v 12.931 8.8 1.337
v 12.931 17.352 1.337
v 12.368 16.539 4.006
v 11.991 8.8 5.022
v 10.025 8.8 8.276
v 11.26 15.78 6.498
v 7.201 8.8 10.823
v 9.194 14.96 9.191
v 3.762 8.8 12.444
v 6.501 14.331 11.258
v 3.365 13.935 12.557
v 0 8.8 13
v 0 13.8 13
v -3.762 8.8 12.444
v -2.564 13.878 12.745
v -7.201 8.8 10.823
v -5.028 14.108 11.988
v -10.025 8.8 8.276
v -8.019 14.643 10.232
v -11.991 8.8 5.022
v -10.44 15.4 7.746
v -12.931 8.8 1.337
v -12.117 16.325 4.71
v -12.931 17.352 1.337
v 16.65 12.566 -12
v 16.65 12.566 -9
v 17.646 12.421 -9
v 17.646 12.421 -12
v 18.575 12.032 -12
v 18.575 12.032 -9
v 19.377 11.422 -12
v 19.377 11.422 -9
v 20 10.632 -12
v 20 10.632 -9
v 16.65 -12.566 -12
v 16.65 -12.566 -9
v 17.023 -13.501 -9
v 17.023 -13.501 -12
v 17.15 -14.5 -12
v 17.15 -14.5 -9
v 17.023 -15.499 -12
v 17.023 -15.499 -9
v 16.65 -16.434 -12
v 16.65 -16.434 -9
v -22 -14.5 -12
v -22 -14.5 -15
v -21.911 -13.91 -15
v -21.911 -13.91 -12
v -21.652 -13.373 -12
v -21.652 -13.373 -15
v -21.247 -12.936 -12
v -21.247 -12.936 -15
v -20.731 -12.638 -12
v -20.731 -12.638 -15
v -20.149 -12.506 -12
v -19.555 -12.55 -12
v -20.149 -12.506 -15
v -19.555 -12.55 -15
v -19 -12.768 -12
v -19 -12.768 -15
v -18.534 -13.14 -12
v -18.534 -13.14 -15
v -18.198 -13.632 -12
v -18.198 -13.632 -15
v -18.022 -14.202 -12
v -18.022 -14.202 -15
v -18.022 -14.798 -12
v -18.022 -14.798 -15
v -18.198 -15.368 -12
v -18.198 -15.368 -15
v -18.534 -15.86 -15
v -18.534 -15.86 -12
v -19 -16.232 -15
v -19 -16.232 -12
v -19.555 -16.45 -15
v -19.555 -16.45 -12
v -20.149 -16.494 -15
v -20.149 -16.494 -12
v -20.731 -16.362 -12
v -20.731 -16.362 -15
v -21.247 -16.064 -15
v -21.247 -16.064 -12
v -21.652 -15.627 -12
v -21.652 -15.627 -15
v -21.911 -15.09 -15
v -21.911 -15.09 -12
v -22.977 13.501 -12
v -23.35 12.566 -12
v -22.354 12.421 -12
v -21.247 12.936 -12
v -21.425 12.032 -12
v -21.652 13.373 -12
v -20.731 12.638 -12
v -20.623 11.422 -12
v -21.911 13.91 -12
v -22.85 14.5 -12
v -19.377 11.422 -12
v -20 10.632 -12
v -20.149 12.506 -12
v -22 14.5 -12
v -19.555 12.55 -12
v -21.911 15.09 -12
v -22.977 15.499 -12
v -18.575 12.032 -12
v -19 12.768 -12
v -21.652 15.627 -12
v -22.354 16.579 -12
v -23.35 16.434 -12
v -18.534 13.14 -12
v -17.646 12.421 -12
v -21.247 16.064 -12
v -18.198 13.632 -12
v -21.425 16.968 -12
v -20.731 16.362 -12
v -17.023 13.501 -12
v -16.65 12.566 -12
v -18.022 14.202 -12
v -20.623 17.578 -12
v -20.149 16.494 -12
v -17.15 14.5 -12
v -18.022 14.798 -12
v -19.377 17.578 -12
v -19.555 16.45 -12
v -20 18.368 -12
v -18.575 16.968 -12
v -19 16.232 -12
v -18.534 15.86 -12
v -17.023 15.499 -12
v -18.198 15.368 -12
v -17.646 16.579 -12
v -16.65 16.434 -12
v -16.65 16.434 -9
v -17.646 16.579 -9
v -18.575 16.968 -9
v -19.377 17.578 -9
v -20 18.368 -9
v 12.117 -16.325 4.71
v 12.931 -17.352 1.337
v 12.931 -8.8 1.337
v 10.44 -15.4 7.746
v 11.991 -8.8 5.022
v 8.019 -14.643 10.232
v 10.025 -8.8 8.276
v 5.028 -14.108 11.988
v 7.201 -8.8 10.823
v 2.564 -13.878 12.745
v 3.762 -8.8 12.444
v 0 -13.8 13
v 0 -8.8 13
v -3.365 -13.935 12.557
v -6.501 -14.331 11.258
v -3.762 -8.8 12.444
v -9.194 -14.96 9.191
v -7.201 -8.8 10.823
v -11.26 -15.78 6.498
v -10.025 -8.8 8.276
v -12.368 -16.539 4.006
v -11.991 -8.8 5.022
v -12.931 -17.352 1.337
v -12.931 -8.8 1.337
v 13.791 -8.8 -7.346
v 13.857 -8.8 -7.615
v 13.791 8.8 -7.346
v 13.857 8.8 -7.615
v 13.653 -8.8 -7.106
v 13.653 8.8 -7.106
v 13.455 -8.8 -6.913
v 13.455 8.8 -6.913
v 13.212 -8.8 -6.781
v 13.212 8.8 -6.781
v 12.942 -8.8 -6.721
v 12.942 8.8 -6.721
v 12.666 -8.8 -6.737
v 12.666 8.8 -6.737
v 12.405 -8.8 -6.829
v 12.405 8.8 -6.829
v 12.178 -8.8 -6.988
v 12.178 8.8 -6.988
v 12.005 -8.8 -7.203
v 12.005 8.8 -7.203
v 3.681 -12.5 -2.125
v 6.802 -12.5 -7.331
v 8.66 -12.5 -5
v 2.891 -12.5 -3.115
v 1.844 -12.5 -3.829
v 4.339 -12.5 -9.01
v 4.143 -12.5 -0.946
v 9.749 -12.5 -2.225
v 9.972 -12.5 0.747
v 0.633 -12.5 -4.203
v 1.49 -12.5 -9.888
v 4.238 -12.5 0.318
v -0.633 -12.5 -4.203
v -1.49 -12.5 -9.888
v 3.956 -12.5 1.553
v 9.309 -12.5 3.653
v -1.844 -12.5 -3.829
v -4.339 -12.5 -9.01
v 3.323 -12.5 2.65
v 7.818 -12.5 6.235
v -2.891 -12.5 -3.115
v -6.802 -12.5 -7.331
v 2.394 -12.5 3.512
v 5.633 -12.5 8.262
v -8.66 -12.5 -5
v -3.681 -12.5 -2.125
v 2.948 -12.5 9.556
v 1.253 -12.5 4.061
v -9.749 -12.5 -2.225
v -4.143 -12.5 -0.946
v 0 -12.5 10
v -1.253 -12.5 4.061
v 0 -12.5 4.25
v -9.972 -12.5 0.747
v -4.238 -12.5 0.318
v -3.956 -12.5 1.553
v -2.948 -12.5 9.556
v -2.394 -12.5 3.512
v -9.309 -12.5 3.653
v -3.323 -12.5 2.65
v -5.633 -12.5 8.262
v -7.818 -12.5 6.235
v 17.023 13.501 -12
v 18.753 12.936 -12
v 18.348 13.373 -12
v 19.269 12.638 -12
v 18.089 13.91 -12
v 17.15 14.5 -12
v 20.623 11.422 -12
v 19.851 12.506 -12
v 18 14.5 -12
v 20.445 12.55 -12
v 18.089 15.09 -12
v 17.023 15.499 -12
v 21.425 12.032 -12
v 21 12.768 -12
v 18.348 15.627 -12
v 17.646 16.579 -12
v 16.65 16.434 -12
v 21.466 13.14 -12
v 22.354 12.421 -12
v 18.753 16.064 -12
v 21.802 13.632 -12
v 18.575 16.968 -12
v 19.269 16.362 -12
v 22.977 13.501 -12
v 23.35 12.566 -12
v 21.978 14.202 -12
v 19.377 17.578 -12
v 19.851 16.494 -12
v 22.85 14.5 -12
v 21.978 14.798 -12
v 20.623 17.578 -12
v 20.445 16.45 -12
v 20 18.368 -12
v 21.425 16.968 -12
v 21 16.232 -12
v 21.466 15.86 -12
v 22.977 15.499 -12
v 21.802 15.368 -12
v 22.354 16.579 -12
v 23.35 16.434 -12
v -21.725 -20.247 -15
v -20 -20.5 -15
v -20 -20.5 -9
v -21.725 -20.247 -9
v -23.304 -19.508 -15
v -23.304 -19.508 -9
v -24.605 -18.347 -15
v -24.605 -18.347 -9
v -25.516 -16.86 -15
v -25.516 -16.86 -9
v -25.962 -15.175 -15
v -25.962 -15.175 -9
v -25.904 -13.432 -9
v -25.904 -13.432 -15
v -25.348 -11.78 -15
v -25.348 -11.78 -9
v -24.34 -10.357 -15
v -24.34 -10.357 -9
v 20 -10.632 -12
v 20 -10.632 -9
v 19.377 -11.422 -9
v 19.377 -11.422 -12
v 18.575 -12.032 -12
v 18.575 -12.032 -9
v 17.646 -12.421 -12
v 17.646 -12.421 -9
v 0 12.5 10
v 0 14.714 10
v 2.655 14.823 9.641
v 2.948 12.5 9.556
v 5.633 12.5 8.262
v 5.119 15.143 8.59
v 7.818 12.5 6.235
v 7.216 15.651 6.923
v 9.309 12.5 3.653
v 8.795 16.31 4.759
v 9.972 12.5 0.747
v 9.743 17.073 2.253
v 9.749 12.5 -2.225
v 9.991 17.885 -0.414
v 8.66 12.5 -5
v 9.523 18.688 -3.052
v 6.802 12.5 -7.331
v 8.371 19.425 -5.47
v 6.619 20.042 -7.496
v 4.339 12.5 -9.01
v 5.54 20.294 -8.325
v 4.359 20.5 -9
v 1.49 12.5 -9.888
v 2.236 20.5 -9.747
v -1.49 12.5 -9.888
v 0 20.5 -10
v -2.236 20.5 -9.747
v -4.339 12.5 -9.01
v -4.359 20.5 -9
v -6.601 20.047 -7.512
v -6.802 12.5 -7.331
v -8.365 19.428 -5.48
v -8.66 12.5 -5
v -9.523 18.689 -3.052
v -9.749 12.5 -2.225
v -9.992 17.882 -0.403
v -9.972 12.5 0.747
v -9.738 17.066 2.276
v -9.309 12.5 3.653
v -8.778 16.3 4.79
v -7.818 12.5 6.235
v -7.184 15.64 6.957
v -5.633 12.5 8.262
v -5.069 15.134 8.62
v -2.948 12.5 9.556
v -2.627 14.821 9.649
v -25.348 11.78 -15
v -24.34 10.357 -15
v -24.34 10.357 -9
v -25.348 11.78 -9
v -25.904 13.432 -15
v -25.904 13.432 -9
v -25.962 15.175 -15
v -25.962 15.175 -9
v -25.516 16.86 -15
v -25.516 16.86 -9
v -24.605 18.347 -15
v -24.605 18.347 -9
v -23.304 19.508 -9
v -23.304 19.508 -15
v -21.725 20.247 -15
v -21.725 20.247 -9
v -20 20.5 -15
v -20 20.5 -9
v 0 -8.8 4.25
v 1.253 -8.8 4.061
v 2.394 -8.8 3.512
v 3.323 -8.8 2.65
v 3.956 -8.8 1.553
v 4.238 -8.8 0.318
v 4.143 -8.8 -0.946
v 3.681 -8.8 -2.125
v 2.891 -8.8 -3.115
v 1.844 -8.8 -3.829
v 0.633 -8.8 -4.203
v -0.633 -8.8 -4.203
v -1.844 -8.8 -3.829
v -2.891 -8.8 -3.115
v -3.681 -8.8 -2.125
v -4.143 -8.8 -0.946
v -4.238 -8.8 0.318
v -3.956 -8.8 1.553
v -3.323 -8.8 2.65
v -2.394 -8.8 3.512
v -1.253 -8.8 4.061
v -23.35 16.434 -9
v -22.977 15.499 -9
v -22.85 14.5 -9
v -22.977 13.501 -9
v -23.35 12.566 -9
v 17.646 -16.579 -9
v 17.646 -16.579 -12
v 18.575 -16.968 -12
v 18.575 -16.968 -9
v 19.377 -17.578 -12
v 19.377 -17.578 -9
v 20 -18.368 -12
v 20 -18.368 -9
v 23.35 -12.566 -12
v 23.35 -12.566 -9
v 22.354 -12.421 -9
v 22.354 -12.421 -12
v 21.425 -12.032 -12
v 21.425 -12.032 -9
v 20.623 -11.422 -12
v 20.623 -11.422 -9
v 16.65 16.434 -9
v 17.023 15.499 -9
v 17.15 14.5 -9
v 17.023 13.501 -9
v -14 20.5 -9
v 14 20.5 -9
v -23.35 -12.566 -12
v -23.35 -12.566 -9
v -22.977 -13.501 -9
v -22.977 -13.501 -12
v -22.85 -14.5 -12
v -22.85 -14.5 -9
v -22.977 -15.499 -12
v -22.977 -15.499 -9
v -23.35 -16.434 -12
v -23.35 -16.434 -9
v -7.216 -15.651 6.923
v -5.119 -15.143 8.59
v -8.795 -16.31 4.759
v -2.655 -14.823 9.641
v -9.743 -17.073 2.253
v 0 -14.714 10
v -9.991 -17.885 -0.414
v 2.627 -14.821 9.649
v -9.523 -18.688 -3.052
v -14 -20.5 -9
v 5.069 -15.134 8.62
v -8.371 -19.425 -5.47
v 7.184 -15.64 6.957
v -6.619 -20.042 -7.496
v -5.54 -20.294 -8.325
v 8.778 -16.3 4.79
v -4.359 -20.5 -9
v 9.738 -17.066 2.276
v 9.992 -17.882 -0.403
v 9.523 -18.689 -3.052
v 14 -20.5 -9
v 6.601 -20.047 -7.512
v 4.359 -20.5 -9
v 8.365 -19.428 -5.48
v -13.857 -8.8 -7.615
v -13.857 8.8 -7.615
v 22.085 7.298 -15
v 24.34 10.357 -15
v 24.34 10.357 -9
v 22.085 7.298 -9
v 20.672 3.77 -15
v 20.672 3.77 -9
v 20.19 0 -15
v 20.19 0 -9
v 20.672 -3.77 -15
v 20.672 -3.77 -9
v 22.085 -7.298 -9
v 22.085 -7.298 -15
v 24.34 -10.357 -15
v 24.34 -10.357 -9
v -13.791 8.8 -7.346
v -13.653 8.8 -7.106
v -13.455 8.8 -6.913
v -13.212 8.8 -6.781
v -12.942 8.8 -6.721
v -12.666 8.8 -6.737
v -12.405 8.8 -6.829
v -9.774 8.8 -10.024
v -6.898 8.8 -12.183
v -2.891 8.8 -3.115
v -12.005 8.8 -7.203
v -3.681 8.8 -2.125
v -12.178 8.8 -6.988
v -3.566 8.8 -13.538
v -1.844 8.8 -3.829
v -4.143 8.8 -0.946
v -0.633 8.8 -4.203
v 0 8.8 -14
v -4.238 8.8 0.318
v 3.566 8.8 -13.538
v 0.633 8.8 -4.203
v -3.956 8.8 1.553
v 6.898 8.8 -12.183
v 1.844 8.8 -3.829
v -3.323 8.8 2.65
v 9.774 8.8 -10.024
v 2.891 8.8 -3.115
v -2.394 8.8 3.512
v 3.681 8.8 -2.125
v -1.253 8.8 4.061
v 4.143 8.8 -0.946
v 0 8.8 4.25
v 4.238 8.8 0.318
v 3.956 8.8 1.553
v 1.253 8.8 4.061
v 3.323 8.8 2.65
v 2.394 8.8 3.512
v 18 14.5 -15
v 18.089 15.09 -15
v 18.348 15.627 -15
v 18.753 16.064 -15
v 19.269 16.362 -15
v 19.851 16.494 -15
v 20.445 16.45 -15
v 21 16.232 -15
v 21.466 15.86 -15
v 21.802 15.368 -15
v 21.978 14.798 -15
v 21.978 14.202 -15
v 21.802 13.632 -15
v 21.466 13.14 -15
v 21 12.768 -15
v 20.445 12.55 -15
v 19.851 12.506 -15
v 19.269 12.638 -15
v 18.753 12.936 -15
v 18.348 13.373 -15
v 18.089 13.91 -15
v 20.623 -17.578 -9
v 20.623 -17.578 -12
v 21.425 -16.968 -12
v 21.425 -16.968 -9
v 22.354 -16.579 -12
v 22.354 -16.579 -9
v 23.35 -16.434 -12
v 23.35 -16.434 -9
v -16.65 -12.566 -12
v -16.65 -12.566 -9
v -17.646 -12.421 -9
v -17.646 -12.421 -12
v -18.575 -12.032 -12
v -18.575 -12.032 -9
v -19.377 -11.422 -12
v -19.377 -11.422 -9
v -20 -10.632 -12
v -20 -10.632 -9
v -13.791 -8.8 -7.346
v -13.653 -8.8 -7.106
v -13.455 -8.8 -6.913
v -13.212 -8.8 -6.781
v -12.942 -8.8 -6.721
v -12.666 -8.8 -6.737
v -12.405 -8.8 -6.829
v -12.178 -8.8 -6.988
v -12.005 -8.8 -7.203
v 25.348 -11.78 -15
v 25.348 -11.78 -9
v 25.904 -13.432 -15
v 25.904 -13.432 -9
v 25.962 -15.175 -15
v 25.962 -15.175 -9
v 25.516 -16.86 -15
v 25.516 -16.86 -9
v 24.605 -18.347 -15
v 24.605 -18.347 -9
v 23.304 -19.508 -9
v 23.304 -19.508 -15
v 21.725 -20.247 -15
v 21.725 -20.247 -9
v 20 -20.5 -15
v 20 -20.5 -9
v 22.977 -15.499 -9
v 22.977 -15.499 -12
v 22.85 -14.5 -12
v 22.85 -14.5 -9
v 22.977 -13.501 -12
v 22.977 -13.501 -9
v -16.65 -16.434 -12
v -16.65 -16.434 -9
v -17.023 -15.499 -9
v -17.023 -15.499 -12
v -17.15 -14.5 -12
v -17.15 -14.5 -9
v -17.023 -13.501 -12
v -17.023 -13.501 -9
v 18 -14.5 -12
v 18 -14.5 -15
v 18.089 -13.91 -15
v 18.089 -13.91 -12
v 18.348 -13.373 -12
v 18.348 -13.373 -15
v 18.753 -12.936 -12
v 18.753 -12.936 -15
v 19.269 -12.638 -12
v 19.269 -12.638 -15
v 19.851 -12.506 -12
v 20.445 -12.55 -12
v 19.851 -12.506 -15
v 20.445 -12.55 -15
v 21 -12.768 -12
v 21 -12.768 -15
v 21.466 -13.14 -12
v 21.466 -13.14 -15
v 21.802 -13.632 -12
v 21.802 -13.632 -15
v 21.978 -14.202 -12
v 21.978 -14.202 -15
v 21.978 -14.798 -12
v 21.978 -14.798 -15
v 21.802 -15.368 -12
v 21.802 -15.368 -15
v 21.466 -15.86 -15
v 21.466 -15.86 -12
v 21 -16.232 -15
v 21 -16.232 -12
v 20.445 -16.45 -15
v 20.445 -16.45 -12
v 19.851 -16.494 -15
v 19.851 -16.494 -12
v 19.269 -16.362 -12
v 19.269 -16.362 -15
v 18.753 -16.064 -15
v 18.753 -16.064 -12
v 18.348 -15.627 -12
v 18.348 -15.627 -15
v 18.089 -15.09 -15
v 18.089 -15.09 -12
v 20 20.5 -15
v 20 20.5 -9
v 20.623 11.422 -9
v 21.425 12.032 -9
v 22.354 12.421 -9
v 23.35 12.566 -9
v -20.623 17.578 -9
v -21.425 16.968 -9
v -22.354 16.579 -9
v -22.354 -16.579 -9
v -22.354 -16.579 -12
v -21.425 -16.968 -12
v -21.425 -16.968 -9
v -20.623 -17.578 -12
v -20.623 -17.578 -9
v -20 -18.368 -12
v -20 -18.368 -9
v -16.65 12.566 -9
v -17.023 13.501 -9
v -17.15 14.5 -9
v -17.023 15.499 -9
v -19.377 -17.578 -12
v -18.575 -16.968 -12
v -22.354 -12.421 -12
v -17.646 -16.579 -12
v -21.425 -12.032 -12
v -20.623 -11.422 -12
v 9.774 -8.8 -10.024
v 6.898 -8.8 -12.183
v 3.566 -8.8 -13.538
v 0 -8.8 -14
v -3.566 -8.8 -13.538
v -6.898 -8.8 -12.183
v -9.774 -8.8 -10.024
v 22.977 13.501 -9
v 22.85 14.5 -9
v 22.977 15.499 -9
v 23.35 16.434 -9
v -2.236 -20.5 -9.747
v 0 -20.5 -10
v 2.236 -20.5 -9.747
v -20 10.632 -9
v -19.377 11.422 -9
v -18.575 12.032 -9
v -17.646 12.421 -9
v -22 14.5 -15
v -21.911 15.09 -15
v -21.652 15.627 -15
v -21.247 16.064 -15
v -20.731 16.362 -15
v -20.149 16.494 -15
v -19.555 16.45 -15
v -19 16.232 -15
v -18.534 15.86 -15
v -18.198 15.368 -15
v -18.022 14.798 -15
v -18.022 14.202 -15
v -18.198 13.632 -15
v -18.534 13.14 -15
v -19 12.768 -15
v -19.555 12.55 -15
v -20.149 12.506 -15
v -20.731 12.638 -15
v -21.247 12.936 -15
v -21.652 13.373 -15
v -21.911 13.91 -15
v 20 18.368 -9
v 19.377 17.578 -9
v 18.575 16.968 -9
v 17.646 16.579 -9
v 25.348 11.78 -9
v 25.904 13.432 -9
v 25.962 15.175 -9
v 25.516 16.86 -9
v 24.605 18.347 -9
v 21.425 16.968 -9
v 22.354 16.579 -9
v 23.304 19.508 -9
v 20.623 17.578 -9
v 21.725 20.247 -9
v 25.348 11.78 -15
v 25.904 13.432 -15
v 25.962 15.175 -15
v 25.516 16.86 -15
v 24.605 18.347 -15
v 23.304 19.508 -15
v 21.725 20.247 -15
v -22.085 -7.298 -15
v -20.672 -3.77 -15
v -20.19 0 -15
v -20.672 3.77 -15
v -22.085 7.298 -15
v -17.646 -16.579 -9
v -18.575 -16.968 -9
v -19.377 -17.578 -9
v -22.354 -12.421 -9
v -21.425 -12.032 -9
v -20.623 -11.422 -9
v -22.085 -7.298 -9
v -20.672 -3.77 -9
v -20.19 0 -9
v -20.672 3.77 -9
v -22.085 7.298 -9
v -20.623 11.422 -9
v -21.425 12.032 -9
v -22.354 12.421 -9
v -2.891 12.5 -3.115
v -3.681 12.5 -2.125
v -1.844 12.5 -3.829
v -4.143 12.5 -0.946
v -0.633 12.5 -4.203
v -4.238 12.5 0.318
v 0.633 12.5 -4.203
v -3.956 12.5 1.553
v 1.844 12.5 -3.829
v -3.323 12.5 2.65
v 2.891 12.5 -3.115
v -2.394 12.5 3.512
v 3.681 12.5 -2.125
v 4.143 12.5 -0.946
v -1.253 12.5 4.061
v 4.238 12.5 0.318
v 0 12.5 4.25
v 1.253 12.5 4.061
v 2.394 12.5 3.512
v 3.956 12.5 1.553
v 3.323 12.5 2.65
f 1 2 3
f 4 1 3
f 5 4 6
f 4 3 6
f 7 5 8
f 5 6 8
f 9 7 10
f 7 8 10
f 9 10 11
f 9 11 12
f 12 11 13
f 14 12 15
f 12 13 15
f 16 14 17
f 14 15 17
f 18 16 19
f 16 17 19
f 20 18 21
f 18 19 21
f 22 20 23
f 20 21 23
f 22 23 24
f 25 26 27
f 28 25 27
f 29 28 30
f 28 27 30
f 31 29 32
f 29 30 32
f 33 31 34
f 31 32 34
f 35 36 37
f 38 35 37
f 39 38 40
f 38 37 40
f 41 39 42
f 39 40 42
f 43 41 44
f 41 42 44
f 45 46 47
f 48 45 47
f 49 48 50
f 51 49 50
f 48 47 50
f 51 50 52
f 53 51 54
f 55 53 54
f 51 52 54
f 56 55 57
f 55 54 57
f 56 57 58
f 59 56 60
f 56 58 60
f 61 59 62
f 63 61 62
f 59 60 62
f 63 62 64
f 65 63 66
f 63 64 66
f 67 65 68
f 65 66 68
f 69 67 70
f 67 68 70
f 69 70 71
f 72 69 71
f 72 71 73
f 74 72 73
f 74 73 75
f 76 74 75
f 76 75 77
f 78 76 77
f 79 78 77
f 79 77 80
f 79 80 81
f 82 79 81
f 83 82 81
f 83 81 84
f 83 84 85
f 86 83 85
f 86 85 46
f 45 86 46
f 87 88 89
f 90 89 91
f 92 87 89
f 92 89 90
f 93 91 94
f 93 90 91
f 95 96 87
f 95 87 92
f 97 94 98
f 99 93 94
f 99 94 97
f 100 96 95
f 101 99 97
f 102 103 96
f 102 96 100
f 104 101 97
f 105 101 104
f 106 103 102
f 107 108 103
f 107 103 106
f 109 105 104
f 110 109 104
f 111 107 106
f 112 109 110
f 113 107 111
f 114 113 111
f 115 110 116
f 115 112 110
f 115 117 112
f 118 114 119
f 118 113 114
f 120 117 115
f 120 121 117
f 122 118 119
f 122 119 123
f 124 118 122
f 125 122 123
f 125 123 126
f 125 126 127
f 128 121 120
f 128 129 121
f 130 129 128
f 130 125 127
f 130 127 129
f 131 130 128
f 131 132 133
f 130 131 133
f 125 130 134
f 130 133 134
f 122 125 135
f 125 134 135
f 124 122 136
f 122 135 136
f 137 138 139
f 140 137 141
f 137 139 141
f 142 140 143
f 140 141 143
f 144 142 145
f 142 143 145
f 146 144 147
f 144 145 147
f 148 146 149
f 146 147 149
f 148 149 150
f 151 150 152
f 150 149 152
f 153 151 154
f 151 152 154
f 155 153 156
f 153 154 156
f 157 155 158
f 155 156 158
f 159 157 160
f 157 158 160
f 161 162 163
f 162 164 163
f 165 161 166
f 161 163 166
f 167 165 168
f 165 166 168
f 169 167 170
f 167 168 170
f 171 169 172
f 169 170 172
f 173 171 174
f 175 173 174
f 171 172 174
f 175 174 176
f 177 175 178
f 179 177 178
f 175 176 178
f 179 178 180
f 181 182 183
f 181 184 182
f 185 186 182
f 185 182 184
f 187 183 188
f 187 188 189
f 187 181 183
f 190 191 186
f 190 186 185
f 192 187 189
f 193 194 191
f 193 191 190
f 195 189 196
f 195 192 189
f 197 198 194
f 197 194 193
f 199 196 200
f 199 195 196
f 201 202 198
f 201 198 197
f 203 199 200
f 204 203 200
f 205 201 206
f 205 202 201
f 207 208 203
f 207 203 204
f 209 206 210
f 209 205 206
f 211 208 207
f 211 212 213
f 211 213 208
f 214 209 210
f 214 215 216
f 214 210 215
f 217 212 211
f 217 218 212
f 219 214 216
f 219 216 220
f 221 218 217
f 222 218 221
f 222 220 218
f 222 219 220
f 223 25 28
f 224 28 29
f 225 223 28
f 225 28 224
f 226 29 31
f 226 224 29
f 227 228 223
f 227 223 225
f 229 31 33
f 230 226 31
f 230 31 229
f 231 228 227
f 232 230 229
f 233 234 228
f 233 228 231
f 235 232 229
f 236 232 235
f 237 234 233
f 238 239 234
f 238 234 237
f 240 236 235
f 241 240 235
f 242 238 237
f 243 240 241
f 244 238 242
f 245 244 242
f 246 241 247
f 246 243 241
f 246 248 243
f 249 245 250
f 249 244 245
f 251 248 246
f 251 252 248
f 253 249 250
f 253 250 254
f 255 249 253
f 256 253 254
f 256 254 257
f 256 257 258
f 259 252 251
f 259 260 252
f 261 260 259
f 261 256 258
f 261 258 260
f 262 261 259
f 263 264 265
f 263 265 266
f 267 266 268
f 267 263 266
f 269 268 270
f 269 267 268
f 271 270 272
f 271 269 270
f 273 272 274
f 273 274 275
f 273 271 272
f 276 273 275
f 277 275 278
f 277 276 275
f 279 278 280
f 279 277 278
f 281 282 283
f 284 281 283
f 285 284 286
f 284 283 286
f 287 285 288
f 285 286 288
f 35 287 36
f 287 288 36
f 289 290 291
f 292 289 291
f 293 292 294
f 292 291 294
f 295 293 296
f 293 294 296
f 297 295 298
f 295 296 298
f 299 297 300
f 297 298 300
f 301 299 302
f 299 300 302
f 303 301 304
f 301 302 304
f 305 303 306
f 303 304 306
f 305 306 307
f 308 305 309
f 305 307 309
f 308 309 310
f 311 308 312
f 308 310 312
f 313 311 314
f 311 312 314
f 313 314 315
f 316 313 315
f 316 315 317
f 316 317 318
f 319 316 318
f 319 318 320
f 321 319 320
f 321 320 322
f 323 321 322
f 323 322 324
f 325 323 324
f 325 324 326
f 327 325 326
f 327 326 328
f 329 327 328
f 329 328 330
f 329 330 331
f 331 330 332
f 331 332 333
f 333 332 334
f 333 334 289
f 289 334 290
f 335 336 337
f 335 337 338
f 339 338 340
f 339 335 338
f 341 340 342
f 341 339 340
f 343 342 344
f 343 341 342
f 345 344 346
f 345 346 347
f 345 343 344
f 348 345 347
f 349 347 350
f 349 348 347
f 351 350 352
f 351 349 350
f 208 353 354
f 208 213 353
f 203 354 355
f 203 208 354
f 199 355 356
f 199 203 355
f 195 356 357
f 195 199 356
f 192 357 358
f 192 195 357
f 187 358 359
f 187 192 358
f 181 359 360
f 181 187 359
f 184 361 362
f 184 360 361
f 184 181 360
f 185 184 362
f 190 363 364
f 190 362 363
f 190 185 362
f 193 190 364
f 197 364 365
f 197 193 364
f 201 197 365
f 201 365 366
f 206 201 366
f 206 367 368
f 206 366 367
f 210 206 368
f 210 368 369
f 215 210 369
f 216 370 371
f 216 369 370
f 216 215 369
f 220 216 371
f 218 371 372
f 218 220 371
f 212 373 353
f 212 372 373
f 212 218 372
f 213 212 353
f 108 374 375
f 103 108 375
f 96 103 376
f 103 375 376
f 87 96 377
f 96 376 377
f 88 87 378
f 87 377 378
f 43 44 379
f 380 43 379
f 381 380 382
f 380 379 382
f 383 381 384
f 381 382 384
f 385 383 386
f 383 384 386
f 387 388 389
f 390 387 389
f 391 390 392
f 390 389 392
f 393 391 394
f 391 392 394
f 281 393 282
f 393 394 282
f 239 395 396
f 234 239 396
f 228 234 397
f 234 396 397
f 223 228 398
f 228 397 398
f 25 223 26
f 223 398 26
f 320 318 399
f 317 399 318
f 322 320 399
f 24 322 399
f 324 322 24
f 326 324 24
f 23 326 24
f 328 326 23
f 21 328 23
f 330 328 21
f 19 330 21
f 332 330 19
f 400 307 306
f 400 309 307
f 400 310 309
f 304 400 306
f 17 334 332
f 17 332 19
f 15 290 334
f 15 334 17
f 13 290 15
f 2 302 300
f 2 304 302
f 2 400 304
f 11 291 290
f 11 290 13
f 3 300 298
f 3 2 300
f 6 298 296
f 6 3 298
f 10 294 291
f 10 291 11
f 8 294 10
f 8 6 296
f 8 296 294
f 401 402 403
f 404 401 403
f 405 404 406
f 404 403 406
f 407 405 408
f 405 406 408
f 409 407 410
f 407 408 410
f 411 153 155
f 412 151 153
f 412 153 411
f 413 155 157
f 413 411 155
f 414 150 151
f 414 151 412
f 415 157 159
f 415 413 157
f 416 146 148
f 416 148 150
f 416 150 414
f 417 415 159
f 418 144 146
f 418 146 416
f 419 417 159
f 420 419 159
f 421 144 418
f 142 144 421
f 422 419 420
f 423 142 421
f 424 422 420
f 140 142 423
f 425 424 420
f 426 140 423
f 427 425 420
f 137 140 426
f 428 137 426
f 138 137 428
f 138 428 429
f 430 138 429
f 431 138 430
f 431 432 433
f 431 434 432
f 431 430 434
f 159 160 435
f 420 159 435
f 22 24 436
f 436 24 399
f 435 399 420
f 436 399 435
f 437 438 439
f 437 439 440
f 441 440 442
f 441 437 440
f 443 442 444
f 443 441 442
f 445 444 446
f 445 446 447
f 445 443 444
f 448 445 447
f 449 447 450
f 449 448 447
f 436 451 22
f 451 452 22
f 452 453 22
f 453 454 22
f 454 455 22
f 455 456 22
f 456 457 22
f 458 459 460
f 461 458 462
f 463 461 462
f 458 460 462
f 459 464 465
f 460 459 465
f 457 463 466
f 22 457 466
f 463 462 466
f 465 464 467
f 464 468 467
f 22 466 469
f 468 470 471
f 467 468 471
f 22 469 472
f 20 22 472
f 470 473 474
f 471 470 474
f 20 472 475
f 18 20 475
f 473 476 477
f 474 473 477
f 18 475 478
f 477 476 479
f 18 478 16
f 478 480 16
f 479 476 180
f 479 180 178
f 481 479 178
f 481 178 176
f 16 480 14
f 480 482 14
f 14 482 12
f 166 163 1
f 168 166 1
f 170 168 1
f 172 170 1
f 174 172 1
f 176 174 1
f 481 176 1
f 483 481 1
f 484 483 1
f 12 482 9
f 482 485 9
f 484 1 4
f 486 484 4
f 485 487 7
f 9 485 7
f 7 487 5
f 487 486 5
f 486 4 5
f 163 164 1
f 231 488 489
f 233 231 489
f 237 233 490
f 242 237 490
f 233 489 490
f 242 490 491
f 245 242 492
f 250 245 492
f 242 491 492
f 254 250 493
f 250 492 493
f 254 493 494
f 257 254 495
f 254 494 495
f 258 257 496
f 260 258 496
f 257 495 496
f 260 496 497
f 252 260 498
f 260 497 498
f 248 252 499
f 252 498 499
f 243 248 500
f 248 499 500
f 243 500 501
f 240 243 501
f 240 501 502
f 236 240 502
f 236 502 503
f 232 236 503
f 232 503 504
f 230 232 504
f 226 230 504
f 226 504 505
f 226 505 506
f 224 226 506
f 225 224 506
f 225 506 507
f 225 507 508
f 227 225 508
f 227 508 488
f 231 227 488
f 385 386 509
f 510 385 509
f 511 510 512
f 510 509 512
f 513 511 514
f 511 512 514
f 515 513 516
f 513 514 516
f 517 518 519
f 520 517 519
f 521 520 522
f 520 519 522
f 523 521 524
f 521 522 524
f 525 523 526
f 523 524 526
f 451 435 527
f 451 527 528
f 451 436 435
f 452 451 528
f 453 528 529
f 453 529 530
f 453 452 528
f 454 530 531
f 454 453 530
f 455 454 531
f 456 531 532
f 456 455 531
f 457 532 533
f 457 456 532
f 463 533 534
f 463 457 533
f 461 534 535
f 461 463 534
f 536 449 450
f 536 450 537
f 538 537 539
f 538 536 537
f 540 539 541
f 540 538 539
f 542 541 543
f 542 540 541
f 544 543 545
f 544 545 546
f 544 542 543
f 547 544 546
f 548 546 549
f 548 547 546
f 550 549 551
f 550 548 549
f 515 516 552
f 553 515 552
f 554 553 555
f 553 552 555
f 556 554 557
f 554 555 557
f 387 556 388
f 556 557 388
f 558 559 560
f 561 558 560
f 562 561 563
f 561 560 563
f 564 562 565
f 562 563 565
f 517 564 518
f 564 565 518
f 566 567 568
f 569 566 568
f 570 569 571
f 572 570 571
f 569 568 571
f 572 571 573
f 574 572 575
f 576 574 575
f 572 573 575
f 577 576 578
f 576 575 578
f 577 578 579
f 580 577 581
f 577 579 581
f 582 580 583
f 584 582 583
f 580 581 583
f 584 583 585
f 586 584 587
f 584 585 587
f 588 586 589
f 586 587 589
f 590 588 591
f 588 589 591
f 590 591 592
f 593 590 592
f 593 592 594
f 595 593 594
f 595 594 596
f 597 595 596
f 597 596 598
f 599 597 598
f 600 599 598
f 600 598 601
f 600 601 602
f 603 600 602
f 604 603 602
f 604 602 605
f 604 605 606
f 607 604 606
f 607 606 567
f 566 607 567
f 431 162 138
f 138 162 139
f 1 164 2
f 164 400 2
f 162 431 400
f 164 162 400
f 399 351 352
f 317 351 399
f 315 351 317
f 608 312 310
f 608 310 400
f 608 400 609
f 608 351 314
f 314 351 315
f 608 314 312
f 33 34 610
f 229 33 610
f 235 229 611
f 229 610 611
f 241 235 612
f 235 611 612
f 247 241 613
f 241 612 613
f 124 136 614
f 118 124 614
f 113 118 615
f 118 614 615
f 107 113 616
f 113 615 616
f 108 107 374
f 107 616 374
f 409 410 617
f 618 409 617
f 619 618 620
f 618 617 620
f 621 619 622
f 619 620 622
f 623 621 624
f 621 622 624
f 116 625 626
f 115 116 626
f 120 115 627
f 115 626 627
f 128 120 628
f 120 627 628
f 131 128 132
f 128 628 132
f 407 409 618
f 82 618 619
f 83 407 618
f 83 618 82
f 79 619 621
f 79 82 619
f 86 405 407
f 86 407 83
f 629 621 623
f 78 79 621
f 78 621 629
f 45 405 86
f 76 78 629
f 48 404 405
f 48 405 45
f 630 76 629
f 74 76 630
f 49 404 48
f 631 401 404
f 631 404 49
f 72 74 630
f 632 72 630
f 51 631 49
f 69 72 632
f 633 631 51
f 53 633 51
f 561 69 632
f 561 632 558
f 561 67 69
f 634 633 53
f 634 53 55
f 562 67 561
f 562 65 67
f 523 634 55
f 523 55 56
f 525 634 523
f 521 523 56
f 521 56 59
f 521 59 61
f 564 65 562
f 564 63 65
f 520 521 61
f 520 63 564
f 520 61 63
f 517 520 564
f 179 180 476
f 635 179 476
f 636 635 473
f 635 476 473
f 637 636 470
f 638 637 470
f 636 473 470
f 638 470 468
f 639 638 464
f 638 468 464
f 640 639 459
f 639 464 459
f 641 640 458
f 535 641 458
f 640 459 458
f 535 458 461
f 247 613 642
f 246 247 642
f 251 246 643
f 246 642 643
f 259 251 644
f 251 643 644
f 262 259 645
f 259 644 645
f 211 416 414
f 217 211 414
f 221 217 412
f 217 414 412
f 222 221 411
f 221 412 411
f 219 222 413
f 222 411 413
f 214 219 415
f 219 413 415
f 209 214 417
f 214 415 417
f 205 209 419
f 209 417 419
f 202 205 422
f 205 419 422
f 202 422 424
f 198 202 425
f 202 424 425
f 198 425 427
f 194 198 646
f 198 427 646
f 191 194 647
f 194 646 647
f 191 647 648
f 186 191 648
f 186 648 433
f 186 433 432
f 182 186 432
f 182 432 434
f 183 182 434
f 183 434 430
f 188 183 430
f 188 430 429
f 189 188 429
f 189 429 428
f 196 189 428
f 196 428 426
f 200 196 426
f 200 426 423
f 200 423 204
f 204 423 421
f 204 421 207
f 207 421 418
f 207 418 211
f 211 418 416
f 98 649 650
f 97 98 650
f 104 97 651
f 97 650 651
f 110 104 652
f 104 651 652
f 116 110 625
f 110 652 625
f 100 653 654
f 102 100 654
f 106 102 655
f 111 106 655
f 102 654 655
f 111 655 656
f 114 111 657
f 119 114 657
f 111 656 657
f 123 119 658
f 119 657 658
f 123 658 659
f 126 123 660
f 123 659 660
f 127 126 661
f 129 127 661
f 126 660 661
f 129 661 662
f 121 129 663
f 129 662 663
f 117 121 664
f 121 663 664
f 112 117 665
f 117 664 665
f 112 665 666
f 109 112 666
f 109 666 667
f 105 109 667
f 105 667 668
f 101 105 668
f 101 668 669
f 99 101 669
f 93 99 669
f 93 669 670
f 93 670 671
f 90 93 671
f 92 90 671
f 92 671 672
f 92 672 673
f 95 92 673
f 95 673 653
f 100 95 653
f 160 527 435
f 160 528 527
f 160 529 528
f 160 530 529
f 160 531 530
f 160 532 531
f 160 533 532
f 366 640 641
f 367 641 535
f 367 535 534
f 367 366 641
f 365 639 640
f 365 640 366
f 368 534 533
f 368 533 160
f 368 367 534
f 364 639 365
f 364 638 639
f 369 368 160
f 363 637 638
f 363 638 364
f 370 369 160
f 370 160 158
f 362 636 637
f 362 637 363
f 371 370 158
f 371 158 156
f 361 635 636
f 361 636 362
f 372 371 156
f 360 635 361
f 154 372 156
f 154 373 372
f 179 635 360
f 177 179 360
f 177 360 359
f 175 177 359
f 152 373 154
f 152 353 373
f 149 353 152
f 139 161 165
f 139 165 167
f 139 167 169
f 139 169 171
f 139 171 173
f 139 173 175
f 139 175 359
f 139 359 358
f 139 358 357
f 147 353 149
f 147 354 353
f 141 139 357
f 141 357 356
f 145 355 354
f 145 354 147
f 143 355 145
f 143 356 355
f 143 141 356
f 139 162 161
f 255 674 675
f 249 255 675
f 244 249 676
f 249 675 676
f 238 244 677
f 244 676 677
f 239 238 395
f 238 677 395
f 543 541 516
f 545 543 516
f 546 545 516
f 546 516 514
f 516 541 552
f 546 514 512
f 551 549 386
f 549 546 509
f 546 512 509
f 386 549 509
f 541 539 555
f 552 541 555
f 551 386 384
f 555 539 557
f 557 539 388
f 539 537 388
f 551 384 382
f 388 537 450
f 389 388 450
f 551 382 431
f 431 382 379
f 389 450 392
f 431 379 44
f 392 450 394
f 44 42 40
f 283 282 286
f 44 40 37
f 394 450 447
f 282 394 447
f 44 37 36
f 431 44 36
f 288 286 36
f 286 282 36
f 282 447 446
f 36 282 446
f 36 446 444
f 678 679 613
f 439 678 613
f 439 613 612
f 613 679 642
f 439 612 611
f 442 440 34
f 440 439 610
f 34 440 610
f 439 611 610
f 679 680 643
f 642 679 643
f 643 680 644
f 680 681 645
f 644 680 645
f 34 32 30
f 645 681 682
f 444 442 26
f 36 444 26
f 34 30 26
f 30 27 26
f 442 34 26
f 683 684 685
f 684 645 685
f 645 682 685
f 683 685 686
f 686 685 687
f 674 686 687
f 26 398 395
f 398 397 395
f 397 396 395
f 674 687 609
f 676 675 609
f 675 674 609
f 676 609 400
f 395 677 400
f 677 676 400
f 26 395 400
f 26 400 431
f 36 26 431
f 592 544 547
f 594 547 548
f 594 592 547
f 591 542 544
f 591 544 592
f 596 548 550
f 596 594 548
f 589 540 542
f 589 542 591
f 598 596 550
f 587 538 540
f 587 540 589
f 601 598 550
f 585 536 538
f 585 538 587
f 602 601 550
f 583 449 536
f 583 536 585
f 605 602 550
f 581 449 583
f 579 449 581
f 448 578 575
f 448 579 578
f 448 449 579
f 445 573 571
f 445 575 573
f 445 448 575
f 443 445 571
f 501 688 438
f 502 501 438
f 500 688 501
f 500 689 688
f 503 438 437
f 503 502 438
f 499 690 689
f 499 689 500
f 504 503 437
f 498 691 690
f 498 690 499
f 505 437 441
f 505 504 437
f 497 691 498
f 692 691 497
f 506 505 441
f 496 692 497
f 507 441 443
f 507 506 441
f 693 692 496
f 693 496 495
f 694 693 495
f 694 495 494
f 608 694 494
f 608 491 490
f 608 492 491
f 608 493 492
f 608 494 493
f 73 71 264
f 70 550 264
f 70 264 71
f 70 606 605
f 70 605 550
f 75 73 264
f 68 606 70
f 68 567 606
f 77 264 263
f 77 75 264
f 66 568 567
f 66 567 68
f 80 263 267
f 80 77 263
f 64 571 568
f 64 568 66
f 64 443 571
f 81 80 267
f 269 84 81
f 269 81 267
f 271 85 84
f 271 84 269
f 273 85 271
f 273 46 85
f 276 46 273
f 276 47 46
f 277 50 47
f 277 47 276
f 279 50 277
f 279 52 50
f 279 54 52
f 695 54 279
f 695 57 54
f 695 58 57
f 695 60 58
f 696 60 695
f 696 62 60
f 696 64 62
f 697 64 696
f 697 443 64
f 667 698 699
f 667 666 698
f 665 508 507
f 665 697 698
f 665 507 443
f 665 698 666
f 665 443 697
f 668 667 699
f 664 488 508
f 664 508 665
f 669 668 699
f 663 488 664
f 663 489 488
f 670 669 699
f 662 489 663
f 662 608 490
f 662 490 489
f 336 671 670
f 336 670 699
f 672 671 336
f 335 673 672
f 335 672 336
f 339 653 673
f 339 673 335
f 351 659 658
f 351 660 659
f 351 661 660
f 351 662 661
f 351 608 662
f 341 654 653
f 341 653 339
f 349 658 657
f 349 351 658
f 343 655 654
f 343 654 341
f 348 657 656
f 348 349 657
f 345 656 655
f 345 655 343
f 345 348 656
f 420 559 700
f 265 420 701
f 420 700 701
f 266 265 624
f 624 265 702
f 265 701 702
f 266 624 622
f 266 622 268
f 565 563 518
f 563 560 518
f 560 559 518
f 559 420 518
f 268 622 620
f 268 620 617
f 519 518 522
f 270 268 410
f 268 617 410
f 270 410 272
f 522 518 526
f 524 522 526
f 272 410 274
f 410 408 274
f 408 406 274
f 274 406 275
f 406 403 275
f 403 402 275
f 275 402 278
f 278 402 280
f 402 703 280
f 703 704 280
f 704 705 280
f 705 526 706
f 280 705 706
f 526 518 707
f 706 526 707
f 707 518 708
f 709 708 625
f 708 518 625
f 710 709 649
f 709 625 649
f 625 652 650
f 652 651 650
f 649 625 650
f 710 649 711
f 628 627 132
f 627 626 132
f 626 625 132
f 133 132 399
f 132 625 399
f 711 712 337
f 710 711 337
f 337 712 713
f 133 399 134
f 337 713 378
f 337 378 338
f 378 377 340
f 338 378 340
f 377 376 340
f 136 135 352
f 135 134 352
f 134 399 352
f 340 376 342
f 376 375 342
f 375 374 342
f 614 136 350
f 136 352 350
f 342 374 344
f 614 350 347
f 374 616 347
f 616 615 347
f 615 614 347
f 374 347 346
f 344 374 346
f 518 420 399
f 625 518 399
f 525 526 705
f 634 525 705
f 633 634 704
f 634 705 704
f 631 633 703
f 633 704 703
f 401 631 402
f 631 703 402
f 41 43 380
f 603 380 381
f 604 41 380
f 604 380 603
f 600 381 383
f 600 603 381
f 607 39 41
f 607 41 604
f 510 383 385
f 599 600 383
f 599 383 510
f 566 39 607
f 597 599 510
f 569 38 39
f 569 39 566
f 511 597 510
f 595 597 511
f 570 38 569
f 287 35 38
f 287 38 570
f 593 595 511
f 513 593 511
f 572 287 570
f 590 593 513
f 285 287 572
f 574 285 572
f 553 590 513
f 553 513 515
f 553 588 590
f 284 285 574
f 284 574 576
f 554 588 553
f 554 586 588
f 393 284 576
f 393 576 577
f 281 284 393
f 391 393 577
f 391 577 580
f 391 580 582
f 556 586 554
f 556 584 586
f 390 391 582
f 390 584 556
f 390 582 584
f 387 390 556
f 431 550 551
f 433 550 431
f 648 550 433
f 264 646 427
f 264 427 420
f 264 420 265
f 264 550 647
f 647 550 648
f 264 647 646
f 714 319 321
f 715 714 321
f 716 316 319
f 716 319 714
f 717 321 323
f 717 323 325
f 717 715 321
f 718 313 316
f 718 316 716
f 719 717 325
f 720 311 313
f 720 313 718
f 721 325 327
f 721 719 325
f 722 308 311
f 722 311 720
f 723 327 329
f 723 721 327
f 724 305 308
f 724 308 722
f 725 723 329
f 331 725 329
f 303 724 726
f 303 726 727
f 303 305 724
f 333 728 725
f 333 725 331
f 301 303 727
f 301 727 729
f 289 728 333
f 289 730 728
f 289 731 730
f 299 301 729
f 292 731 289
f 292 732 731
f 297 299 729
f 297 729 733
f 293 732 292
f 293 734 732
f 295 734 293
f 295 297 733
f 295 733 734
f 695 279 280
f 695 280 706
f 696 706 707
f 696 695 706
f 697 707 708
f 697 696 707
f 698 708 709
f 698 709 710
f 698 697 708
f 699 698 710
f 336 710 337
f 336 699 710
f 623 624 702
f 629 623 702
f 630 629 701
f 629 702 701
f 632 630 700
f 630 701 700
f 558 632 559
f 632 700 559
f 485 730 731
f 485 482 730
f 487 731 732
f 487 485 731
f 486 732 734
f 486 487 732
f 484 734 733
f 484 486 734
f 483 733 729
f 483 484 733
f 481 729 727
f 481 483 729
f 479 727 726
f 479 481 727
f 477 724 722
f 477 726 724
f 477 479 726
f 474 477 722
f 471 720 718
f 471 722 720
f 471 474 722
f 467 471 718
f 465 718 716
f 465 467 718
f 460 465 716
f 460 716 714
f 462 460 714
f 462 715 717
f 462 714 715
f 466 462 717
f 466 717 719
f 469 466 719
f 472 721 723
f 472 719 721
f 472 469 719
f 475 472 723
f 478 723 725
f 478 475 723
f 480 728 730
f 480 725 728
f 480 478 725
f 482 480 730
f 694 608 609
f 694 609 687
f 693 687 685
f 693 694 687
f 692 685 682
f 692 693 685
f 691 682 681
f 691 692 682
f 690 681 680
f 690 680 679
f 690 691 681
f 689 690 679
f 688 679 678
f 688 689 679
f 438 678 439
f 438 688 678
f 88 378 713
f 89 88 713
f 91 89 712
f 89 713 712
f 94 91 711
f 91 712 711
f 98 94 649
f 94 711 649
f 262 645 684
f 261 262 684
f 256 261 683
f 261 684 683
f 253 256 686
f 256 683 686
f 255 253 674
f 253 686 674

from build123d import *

# Parameters (mm, degrees)
SKETCH1_R            = 4.25
BOSS_EXTRUDE1_DEPTH  = 20.5
SKETCH2_W            = 14
SKETCH2_H            = 17.6
CUT_EXTRUDE1_DEPTH   = 29
SKETCH7_R            = 1
BOSS_EXTRUDE2_DEPTH  = 6
CUT_EXTRUDE6_DEPTH   = 3
SKETCH4_R            = 2
CUT_EXTRUDE2_DEPTH   = 7
SKETCH5_R            = 10
CUT_EXTRUDE3_DEPTH   = 8
SKETCH6_R            = 10
CUT_EXTRUDE4_DEPTH   = 8
FILLET1_R            = 1
CUT_EXTRUDE7_DEPTH   = 3
LPATTERN1_COUNT      = 2
LPATTERN1_PITCH      = 40
LPATTERN1_COUNT_DIR2 = 2
LPATTERN1_PITCH_DIR2 = 29


with BuildPart() as part:
    # Sketch1 → Boss-Extrude1 (new body, symmetric)
    with BuildSketch(Plane(origin=(0, 0, 0), x_dir=(1, 0, 0), z_dir=(0, 1, 0))):
        with BuildLine():
            Line((-12.931045729, -1.337182245), (-14, 9))
            Line((-14, 9), (-14, 15))
            Line((-14, 15), (14, 15))
            Line((14, 15), (14, 9))
            Line((14, 9), (12.931045729, -1.337182245))
            ThreePointArc((12.931045729, -1.337182245), (0, -13), (-12.931045729, -1.337182245))
        make_face()
        with Locations(Location((0, 0, 0), (0, 0, 270))):  # turned: the seam where the file's is
            Circle(SKETCH1_R, mode=Mode.SUBTRACT)
    extrude(amount=BOSS_EXTRUDE1_DEPTH, both=True)

    # Sketch2 → Cut-Revolve1 (revolve, cut)
    with BuildSketch(Plane(origin=(0, 0, 0), x_dir=(0, 0, -1), z_dir=(1, 0, 0))):
        with Locations((-7, 0)):
            Rectangle(SKETCH2_W, SKETCH2_H)
    revolve(axis=Axis((0, 0, 0), (0, 1, 0)), mode=Mode.SUBTRACT)

    # Sketch3 → Cut-Extrude1 (cut, through all)
    with BuildSketch(Plane(origin=(14, 0, 0), x_dir=(0, 0, -1), z_dir=(1, 0, 0))):
        Polygon((9, 20.5), (-13, 13.8), (-13, 20.5), align=None)
        Polygon((-13, -13.8), (9, -20.5), (-13, -20.5), align=None)
    extrude(amount=-CUT_EXTRUDE1_DEPTH, mode=Mode.SUBTRACT)

    # Sketch7 → Boss-Extrude2 (add)
    with BuildSketch(Plane(origin=(0, 0, -15), x_dir=(-1, 0, 0), z_dir=(0, 0, -1))):
        with BuildLine():
            Line((20, 20.5), (14, 20.5))
            Line((14, 20.5), (14, -20.5))
            Line((14, -20.5), (20, -20.5))
            ThreePointArc((20, -20.5), (25.516209879, -16.860387377), (24.340130723, -10.357142857))
            ThreePointArc((24.340130723, -10.357142857), (20.190457531, 0), (24.340130723, 10.357142857))
            ThreePointArc((24.340130723, 10.357142857), (25.516209879, 16.860387377), (20, 20.5))
        make_face()
        with Locations((20, -14.5)):
            Circle(SKETCH7_R, mode=Mode.SUBTRACT)
        with Locations((20, 14.5)):
            Circle(SKETCH7_R, mode=Mode.SUBTRACT)
        with BuildLine():
            Line((-20, -20.5), (-14, -20.5))
            Line((-14, -20.5), (-14, 20.5))
            Line((-14, 20.5), (-20, 20.5))
            ThreePointArc((-20, 20.5), (-25.516209879, 16.860387377), (-24.340130723, 10.357142857))
            ThreePointArc((-24.340130723, 10.357142857), (-20.190457531, 0), (-24.340130723, -10.357142857))
            ThreePointArc((-24.340130723, -10.357142857), (-25.516209879, -16.860387377), (-20, -20.5))
        make_face()
        with Locations((-20, 14.5)):
            Circle(SKETCH7_R, mode=Mode.SUBTRACT)
        with Locations((-20, -14.5)):
            Circle(SKETCH7_R, mode=Mode.SUBTRACT)
    extrude(amount=-BOSS_EXTRUDE2_DEPTH)

    # Sketch8 → Cut-Extrude6 (cut)
    with BuildSketch(Plane.XY.offset(-9)):
        Polygon((-17.15, 12.854551733), (-17.15, 16.145448267), (-20, 17.790896534), (-22.85, 16.145448267), (-22.85, 12.854551733), (-20, 11.209103466), align=None)
        Polygon((-17.15, -12.854551733), (-20, -11.209103466), (-22.85, -12.854551733), (-22.85, -16.145448267), (-20, -17.790896534), (-17.15, -16.145448267), align=None)
        Polygon((22.85, -12.854551733), (20, -11.209103466), (17.15, -12.854551733), (17.15, -16.145448267), (20, -17.790896534), (22.85, -16.145448267), align=None)
        Polygon((22.85, 12.854551733), (22.85, 16.145448267), (20, 17.790896534), (17.15, 16.145448267), (17.15, 12.854551733), (20, 11.209103466), align=None)
    extrude(amount=-CUT_EXTRUDE6_DEPTH, mode=Mode.SUBTRACT)

    # Sketch4 → Cut-Extrude2 (cut)
    with BuildSketch(Plane(origin=(0, 0, -15), x_dir=(-1, 0, 0), z_dir=(0, 0, -1))):
        with Locations((-20, 14.5)):
            Circle(SKETCH4_R)
        with Locations((20, 14.5)):
            Circle(SKETCH4_R)
        with Locations((-20, -14.5)):
            Circle(SKETCH4_R)
        with Locations((20, -14.5)):
            Circle(SKETCH4_R)
    extrude(amount=-CUT_EXTRUDE2_DEPTH, mode=Mode.SUBTRACT)

    # Sketch5 → Cut-Extrude3 (cut)
    with BuildSketch(Plane(origin=(0, 20.5, 0), x_dir=(1, 0, 0), z_dir=(0, 1, 0))):
        with Locations(Location((0, 0, 0), (0, 0, 270))):  # turned: the seam where the file's is
            Circle(SKETCH5_R)
    extrude(amount=-CUT_EXTRUDE3_DEPTH, mode=Mode.SUBTRACT)

    # Sketch6 → Cut-Extrude4 (cut)
    with BuildSketch(Plane.XZ.offset(20.5)):
        with Locations(Location((0, 0, 0), (0, 0, 90))):  # turned: the seam where the file's is
            Circle(SKETCH6_R)
    extrude(amount=-CUT_EXTRUDE4_DEPTH, mode=Mode.SUBTRACT)

    # Fillet1
    fillet1_edges = [part.edges().sort_by_distance(p)[0] for p in [
        (13.465522864, 0, -3.831408877),
        (-13.465522864, 0, -3.831408877),
    ]]
    fillet(fillet1_edges, radius=FILLET1_R)

    # Sketch9 → Cut-Extrude7 (cut)
    with BuildSketch(Plane.XY.offset(-9)):
        with BuildLine():
            ThreePointArc((-23.35, 16.434123402), (-22.85, 14.5), (-23.35, 12.565876598))
            ThreePointArc((-23.35, 12.565876598), (-21.425, 12.031827599), (-20, 10.631753196))
            ThreePointArc((-20, 10.631753196), (-18.575, 12.031827599), (-16.65, 12.565876598))
            ThreePointArc((-16.65, 12.565876598), (-17.15, 14.5), (-16.65, 16.434123402))
            ThreePointArc((-16.65, 16.434123402), (-18.575, 16.968172401), (-20, 18.368246804))
            ThreePointArc((-20, 18.368246804), (-21.425, 16.968172401), (-23.35, 16.434123402))
        make_face()
    cut_extrude7 = extrude(amount=-CUT_EXTRUDE7_DEPTH, mode=Mode.SUBTRACT)

    # LPattern1: Cut-Extrude7 2 × 2
    with Locations(*[(i * LPATTERN1_PITCH, -j * LPATTERN1_PITCH_DIR2, 0) for i in range(LPATTERN1_COUNT) for j in range(LPATTERN1_COUNT_DIR2) if (i, j) != (0, 0)]):
        add(cut_extrude7, mode=Mode.SUBTRACT)


solid = part.part
